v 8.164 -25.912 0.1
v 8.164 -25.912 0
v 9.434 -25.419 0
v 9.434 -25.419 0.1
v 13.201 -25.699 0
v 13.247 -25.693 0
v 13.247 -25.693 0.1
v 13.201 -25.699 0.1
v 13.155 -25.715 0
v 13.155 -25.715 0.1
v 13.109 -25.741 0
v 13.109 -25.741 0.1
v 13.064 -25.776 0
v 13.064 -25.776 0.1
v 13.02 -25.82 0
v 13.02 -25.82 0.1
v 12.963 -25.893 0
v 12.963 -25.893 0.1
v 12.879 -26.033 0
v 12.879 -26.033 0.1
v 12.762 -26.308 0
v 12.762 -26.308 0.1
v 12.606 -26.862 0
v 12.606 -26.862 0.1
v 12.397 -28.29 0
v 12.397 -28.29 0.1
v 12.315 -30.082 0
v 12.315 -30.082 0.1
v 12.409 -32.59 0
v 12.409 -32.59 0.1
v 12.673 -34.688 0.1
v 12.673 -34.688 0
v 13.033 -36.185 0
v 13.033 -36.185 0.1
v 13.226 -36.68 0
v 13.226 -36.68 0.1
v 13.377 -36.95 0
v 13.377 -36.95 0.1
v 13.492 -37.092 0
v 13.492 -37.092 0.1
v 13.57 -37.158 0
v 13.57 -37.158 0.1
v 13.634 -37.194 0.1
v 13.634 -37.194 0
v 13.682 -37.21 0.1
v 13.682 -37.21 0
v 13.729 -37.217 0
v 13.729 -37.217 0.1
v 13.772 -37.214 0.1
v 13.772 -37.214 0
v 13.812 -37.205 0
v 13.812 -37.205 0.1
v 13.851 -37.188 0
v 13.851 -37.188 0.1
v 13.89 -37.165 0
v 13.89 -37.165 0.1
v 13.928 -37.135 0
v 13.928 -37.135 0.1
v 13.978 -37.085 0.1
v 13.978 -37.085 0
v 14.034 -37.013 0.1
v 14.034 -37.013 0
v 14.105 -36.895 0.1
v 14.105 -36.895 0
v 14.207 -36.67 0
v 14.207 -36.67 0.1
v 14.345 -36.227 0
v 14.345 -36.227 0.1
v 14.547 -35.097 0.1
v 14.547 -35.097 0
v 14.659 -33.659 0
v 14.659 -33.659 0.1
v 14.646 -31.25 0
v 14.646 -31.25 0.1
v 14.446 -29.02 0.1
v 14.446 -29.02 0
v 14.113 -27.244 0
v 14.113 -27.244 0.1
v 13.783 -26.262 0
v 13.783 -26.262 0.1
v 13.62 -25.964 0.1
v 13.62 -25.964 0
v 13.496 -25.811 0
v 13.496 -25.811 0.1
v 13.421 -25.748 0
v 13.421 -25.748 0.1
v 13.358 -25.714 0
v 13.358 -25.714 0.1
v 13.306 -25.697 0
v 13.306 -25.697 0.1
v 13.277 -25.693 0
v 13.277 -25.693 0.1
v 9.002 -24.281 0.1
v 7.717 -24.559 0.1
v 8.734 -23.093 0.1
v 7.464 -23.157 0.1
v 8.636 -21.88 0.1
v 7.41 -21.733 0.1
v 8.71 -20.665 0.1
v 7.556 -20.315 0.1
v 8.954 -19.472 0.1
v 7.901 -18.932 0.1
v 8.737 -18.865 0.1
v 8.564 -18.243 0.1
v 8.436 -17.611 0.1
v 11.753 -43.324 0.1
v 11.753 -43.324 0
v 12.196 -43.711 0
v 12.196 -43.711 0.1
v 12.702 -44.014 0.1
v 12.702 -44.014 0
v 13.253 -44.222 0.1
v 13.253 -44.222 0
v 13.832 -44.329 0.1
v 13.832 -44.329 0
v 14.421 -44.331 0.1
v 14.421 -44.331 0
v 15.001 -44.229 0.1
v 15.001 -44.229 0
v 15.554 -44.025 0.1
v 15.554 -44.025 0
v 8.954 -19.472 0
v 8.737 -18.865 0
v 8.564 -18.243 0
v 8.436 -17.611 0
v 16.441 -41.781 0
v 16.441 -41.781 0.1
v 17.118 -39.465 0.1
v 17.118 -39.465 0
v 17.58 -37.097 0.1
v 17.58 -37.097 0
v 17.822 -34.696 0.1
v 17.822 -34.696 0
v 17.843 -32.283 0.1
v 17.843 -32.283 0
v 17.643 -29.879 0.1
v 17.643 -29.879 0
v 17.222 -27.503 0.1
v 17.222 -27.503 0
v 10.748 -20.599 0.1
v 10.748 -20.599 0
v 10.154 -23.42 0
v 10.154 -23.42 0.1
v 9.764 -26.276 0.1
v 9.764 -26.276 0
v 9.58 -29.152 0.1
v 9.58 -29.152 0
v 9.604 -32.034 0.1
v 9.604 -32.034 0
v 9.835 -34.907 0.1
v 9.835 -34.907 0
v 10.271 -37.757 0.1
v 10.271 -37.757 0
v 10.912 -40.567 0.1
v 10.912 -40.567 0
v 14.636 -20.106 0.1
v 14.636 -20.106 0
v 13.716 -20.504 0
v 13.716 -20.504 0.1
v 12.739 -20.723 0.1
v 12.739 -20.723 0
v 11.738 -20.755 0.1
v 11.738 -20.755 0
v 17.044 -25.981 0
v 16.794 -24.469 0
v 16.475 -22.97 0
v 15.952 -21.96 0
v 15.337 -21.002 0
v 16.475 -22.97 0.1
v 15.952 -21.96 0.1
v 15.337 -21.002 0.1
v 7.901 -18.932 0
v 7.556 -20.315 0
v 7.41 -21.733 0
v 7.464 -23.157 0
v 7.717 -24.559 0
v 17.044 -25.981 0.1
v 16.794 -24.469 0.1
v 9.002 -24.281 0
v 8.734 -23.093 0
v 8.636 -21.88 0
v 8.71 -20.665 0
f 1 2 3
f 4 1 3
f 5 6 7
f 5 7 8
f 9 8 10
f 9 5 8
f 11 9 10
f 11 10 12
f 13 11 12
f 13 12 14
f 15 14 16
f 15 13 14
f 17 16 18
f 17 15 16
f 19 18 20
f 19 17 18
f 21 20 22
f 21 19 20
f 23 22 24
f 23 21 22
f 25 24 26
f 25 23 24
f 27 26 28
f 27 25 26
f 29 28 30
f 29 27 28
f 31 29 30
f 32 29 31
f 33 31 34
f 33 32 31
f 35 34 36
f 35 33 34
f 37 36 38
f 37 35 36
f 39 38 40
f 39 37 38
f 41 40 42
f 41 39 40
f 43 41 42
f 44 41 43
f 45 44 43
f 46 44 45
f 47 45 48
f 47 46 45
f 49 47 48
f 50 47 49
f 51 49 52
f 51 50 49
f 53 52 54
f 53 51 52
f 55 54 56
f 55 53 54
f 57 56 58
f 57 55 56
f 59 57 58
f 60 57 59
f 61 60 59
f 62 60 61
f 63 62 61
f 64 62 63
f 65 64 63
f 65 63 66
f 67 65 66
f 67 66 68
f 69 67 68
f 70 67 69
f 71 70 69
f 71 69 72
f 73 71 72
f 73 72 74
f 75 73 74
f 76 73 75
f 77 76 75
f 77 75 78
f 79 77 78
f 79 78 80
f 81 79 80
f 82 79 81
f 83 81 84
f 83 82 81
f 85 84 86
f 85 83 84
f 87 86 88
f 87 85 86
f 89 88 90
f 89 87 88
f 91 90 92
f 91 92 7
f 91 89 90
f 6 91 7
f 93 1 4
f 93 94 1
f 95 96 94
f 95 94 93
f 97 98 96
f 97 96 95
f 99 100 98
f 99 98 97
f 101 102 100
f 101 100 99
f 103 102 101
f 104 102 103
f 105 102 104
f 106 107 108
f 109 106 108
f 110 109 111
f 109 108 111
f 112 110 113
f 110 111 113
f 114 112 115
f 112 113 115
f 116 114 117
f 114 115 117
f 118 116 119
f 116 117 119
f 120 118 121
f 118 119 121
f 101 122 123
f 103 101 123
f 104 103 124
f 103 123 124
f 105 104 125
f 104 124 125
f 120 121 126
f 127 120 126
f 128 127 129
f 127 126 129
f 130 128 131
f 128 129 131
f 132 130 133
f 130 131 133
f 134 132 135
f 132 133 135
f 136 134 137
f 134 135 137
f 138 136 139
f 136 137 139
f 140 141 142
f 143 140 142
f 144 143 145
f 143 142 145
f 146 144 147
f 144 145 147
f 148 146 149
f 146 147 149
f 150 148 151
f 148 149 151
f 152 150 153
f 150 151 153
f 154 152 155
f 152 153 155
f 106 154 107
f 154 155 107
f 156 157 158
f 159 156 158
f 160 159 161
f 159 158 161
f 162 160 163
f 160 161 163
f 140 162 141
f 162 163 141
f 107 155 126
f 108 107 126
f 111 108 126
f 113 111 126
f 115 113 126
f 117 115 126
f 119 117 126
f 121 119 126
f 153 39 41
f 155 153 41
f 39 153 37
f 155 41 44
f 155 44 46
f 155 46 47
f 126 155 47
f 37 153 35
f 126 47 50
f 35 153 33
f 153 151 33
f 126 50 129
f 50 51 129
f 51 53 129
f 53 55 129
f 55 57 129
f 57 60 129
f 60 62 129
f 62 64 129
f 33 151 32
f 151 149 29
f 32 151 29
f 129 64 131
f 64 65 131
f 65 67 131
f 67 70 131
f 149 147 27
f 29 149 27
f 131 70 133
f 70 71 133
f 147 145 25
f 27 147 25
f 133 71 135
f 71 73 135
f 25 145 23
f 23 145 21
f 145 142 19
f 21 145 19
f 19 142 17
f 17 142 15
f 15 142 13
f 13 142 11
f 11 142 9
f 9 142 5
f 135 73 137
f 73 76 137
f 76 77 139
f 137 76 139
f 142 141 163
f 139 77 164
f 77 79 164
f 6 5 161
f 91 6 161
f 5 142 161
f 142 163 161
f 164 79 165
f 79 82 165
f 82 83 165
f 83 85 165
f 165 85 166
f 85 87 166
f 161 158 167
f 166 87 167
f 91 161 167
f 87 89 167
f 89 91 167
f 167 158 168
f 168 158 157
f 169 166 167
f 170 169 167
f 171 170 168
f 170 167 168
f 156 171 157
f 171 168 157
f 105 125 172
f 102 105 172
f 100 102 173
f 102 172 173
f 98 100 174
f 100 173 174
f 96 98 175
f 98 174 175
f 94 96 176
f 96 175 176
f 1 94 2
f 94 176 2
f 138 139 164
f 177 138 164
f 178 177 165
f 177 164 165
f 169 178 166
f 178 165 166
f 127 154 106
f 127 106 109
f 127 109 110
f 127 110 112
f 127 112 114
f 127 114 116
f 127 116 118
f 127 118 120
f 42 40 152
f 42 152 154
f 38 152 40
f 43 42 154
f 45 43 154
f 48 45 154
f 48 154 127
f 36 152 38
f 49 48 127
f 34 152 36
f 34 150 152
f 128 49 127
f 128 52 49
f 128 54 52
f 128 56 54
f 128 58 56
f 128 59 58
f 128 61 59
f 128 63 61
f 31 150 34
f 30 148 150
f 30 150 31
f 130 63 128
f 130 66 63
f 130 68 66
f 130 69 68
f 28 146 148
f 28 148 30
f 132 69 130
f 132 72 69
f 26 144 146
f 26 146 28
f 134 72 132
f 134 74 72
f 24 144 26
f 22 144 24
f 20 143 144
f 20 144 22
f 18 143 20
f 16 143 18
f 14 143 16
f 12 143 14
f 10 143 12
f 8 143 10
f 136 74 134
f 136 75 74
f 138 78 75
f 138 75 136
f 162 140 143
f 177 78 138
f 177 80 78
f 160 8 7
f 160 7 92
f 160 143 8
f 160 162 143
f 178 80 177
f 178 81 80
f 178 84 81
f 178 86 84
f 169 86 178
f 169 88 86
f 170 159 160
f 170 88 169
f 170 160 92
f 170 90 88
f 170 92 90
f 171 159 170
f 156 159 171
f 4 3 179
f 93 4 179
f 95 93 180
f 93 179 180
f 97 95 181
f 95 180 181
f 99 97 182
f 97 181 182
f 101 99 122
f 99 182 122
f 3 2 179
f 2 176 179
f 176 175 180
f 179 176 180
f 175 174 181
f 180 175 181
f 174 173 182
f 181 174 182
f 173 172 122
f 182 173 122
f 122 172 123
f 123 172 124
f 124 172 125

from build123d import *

# Parameters (mm, degrees)
SALIENTE_EXTRUIR1_DEPTH   = 0.1
MODEL_RX                  = 5.767455875
MODEL_RY                  = 1.157489638
SALIENTE_EXTRUIR1_2_DEPTH = 0.1


with BuildPart() as part:
    # Model → Saliente-Extruir1 (new body)
    with BuildSketch(Plane.XY):
        with BuildLine():
            Line((8.164460664, -25.912149457), (9.434463248, -25.418589136))
            ThreePointArc((9.434463248, -25.418589136), (8.663712085, -22.488322992), (8.954005148, -19.47232449))
            ThreePointArc((8.954005148, -19.47232449), (8.644531078, -18.555691694), (8.435601468, -17.611055097))
            ThreePointArc((8.435601468, -17.611055097), (7.409664196, -21.732519993), (8.164460664, -25.912149457))
        make_face()
    extrude(amount=SALIENTE_EXTRUIR1_DEPTH)


with BuildPart() as body_2:
    # Model → Saliente-Extruir1 2 (new body)
    with BuildSketch(Plane.XY):
        with BuildLine():
            ThreePointArc((15.55401823, -44.025149476), (17.728376415, -35.899156196), (17.222447112, -27.502511877))
            ThreePointArc((17.222447112, -27.502511877), (16.927732602, -25.223227177), (16.475194288, -22.969961888))
            ThreePointArc((16.475194288, -22.969961888), (15.655243323, -21.473904412), (14.635720073, -20.106030184))
            ThreePointArc((14.635720073, -20.106030184), (12.739052379, -20.722754687), (10.748454163, -20.59940075))
            ThreePointArc((10.748454163, -20.59940075), (9.603726479, -32.034356801), (11.752771541, -43.323742377))
            ThreePointArc((11.752771541, -43.323742377), (13.540053552, -44.288694584), (15.55401823, -44.025149476))
        make_face()
        with Locations(Location((13.497177395, -31.454583951), (0, 0, 92.484183825))):
            Ellipse(MODEL_RX, MODEL_RY, mode=Mode.SUBTRACT)
    extrude(amount=SALIENTE_EXTRUIR1_2_DEPTH)


solid = Compound([part.part, body_2.part])
